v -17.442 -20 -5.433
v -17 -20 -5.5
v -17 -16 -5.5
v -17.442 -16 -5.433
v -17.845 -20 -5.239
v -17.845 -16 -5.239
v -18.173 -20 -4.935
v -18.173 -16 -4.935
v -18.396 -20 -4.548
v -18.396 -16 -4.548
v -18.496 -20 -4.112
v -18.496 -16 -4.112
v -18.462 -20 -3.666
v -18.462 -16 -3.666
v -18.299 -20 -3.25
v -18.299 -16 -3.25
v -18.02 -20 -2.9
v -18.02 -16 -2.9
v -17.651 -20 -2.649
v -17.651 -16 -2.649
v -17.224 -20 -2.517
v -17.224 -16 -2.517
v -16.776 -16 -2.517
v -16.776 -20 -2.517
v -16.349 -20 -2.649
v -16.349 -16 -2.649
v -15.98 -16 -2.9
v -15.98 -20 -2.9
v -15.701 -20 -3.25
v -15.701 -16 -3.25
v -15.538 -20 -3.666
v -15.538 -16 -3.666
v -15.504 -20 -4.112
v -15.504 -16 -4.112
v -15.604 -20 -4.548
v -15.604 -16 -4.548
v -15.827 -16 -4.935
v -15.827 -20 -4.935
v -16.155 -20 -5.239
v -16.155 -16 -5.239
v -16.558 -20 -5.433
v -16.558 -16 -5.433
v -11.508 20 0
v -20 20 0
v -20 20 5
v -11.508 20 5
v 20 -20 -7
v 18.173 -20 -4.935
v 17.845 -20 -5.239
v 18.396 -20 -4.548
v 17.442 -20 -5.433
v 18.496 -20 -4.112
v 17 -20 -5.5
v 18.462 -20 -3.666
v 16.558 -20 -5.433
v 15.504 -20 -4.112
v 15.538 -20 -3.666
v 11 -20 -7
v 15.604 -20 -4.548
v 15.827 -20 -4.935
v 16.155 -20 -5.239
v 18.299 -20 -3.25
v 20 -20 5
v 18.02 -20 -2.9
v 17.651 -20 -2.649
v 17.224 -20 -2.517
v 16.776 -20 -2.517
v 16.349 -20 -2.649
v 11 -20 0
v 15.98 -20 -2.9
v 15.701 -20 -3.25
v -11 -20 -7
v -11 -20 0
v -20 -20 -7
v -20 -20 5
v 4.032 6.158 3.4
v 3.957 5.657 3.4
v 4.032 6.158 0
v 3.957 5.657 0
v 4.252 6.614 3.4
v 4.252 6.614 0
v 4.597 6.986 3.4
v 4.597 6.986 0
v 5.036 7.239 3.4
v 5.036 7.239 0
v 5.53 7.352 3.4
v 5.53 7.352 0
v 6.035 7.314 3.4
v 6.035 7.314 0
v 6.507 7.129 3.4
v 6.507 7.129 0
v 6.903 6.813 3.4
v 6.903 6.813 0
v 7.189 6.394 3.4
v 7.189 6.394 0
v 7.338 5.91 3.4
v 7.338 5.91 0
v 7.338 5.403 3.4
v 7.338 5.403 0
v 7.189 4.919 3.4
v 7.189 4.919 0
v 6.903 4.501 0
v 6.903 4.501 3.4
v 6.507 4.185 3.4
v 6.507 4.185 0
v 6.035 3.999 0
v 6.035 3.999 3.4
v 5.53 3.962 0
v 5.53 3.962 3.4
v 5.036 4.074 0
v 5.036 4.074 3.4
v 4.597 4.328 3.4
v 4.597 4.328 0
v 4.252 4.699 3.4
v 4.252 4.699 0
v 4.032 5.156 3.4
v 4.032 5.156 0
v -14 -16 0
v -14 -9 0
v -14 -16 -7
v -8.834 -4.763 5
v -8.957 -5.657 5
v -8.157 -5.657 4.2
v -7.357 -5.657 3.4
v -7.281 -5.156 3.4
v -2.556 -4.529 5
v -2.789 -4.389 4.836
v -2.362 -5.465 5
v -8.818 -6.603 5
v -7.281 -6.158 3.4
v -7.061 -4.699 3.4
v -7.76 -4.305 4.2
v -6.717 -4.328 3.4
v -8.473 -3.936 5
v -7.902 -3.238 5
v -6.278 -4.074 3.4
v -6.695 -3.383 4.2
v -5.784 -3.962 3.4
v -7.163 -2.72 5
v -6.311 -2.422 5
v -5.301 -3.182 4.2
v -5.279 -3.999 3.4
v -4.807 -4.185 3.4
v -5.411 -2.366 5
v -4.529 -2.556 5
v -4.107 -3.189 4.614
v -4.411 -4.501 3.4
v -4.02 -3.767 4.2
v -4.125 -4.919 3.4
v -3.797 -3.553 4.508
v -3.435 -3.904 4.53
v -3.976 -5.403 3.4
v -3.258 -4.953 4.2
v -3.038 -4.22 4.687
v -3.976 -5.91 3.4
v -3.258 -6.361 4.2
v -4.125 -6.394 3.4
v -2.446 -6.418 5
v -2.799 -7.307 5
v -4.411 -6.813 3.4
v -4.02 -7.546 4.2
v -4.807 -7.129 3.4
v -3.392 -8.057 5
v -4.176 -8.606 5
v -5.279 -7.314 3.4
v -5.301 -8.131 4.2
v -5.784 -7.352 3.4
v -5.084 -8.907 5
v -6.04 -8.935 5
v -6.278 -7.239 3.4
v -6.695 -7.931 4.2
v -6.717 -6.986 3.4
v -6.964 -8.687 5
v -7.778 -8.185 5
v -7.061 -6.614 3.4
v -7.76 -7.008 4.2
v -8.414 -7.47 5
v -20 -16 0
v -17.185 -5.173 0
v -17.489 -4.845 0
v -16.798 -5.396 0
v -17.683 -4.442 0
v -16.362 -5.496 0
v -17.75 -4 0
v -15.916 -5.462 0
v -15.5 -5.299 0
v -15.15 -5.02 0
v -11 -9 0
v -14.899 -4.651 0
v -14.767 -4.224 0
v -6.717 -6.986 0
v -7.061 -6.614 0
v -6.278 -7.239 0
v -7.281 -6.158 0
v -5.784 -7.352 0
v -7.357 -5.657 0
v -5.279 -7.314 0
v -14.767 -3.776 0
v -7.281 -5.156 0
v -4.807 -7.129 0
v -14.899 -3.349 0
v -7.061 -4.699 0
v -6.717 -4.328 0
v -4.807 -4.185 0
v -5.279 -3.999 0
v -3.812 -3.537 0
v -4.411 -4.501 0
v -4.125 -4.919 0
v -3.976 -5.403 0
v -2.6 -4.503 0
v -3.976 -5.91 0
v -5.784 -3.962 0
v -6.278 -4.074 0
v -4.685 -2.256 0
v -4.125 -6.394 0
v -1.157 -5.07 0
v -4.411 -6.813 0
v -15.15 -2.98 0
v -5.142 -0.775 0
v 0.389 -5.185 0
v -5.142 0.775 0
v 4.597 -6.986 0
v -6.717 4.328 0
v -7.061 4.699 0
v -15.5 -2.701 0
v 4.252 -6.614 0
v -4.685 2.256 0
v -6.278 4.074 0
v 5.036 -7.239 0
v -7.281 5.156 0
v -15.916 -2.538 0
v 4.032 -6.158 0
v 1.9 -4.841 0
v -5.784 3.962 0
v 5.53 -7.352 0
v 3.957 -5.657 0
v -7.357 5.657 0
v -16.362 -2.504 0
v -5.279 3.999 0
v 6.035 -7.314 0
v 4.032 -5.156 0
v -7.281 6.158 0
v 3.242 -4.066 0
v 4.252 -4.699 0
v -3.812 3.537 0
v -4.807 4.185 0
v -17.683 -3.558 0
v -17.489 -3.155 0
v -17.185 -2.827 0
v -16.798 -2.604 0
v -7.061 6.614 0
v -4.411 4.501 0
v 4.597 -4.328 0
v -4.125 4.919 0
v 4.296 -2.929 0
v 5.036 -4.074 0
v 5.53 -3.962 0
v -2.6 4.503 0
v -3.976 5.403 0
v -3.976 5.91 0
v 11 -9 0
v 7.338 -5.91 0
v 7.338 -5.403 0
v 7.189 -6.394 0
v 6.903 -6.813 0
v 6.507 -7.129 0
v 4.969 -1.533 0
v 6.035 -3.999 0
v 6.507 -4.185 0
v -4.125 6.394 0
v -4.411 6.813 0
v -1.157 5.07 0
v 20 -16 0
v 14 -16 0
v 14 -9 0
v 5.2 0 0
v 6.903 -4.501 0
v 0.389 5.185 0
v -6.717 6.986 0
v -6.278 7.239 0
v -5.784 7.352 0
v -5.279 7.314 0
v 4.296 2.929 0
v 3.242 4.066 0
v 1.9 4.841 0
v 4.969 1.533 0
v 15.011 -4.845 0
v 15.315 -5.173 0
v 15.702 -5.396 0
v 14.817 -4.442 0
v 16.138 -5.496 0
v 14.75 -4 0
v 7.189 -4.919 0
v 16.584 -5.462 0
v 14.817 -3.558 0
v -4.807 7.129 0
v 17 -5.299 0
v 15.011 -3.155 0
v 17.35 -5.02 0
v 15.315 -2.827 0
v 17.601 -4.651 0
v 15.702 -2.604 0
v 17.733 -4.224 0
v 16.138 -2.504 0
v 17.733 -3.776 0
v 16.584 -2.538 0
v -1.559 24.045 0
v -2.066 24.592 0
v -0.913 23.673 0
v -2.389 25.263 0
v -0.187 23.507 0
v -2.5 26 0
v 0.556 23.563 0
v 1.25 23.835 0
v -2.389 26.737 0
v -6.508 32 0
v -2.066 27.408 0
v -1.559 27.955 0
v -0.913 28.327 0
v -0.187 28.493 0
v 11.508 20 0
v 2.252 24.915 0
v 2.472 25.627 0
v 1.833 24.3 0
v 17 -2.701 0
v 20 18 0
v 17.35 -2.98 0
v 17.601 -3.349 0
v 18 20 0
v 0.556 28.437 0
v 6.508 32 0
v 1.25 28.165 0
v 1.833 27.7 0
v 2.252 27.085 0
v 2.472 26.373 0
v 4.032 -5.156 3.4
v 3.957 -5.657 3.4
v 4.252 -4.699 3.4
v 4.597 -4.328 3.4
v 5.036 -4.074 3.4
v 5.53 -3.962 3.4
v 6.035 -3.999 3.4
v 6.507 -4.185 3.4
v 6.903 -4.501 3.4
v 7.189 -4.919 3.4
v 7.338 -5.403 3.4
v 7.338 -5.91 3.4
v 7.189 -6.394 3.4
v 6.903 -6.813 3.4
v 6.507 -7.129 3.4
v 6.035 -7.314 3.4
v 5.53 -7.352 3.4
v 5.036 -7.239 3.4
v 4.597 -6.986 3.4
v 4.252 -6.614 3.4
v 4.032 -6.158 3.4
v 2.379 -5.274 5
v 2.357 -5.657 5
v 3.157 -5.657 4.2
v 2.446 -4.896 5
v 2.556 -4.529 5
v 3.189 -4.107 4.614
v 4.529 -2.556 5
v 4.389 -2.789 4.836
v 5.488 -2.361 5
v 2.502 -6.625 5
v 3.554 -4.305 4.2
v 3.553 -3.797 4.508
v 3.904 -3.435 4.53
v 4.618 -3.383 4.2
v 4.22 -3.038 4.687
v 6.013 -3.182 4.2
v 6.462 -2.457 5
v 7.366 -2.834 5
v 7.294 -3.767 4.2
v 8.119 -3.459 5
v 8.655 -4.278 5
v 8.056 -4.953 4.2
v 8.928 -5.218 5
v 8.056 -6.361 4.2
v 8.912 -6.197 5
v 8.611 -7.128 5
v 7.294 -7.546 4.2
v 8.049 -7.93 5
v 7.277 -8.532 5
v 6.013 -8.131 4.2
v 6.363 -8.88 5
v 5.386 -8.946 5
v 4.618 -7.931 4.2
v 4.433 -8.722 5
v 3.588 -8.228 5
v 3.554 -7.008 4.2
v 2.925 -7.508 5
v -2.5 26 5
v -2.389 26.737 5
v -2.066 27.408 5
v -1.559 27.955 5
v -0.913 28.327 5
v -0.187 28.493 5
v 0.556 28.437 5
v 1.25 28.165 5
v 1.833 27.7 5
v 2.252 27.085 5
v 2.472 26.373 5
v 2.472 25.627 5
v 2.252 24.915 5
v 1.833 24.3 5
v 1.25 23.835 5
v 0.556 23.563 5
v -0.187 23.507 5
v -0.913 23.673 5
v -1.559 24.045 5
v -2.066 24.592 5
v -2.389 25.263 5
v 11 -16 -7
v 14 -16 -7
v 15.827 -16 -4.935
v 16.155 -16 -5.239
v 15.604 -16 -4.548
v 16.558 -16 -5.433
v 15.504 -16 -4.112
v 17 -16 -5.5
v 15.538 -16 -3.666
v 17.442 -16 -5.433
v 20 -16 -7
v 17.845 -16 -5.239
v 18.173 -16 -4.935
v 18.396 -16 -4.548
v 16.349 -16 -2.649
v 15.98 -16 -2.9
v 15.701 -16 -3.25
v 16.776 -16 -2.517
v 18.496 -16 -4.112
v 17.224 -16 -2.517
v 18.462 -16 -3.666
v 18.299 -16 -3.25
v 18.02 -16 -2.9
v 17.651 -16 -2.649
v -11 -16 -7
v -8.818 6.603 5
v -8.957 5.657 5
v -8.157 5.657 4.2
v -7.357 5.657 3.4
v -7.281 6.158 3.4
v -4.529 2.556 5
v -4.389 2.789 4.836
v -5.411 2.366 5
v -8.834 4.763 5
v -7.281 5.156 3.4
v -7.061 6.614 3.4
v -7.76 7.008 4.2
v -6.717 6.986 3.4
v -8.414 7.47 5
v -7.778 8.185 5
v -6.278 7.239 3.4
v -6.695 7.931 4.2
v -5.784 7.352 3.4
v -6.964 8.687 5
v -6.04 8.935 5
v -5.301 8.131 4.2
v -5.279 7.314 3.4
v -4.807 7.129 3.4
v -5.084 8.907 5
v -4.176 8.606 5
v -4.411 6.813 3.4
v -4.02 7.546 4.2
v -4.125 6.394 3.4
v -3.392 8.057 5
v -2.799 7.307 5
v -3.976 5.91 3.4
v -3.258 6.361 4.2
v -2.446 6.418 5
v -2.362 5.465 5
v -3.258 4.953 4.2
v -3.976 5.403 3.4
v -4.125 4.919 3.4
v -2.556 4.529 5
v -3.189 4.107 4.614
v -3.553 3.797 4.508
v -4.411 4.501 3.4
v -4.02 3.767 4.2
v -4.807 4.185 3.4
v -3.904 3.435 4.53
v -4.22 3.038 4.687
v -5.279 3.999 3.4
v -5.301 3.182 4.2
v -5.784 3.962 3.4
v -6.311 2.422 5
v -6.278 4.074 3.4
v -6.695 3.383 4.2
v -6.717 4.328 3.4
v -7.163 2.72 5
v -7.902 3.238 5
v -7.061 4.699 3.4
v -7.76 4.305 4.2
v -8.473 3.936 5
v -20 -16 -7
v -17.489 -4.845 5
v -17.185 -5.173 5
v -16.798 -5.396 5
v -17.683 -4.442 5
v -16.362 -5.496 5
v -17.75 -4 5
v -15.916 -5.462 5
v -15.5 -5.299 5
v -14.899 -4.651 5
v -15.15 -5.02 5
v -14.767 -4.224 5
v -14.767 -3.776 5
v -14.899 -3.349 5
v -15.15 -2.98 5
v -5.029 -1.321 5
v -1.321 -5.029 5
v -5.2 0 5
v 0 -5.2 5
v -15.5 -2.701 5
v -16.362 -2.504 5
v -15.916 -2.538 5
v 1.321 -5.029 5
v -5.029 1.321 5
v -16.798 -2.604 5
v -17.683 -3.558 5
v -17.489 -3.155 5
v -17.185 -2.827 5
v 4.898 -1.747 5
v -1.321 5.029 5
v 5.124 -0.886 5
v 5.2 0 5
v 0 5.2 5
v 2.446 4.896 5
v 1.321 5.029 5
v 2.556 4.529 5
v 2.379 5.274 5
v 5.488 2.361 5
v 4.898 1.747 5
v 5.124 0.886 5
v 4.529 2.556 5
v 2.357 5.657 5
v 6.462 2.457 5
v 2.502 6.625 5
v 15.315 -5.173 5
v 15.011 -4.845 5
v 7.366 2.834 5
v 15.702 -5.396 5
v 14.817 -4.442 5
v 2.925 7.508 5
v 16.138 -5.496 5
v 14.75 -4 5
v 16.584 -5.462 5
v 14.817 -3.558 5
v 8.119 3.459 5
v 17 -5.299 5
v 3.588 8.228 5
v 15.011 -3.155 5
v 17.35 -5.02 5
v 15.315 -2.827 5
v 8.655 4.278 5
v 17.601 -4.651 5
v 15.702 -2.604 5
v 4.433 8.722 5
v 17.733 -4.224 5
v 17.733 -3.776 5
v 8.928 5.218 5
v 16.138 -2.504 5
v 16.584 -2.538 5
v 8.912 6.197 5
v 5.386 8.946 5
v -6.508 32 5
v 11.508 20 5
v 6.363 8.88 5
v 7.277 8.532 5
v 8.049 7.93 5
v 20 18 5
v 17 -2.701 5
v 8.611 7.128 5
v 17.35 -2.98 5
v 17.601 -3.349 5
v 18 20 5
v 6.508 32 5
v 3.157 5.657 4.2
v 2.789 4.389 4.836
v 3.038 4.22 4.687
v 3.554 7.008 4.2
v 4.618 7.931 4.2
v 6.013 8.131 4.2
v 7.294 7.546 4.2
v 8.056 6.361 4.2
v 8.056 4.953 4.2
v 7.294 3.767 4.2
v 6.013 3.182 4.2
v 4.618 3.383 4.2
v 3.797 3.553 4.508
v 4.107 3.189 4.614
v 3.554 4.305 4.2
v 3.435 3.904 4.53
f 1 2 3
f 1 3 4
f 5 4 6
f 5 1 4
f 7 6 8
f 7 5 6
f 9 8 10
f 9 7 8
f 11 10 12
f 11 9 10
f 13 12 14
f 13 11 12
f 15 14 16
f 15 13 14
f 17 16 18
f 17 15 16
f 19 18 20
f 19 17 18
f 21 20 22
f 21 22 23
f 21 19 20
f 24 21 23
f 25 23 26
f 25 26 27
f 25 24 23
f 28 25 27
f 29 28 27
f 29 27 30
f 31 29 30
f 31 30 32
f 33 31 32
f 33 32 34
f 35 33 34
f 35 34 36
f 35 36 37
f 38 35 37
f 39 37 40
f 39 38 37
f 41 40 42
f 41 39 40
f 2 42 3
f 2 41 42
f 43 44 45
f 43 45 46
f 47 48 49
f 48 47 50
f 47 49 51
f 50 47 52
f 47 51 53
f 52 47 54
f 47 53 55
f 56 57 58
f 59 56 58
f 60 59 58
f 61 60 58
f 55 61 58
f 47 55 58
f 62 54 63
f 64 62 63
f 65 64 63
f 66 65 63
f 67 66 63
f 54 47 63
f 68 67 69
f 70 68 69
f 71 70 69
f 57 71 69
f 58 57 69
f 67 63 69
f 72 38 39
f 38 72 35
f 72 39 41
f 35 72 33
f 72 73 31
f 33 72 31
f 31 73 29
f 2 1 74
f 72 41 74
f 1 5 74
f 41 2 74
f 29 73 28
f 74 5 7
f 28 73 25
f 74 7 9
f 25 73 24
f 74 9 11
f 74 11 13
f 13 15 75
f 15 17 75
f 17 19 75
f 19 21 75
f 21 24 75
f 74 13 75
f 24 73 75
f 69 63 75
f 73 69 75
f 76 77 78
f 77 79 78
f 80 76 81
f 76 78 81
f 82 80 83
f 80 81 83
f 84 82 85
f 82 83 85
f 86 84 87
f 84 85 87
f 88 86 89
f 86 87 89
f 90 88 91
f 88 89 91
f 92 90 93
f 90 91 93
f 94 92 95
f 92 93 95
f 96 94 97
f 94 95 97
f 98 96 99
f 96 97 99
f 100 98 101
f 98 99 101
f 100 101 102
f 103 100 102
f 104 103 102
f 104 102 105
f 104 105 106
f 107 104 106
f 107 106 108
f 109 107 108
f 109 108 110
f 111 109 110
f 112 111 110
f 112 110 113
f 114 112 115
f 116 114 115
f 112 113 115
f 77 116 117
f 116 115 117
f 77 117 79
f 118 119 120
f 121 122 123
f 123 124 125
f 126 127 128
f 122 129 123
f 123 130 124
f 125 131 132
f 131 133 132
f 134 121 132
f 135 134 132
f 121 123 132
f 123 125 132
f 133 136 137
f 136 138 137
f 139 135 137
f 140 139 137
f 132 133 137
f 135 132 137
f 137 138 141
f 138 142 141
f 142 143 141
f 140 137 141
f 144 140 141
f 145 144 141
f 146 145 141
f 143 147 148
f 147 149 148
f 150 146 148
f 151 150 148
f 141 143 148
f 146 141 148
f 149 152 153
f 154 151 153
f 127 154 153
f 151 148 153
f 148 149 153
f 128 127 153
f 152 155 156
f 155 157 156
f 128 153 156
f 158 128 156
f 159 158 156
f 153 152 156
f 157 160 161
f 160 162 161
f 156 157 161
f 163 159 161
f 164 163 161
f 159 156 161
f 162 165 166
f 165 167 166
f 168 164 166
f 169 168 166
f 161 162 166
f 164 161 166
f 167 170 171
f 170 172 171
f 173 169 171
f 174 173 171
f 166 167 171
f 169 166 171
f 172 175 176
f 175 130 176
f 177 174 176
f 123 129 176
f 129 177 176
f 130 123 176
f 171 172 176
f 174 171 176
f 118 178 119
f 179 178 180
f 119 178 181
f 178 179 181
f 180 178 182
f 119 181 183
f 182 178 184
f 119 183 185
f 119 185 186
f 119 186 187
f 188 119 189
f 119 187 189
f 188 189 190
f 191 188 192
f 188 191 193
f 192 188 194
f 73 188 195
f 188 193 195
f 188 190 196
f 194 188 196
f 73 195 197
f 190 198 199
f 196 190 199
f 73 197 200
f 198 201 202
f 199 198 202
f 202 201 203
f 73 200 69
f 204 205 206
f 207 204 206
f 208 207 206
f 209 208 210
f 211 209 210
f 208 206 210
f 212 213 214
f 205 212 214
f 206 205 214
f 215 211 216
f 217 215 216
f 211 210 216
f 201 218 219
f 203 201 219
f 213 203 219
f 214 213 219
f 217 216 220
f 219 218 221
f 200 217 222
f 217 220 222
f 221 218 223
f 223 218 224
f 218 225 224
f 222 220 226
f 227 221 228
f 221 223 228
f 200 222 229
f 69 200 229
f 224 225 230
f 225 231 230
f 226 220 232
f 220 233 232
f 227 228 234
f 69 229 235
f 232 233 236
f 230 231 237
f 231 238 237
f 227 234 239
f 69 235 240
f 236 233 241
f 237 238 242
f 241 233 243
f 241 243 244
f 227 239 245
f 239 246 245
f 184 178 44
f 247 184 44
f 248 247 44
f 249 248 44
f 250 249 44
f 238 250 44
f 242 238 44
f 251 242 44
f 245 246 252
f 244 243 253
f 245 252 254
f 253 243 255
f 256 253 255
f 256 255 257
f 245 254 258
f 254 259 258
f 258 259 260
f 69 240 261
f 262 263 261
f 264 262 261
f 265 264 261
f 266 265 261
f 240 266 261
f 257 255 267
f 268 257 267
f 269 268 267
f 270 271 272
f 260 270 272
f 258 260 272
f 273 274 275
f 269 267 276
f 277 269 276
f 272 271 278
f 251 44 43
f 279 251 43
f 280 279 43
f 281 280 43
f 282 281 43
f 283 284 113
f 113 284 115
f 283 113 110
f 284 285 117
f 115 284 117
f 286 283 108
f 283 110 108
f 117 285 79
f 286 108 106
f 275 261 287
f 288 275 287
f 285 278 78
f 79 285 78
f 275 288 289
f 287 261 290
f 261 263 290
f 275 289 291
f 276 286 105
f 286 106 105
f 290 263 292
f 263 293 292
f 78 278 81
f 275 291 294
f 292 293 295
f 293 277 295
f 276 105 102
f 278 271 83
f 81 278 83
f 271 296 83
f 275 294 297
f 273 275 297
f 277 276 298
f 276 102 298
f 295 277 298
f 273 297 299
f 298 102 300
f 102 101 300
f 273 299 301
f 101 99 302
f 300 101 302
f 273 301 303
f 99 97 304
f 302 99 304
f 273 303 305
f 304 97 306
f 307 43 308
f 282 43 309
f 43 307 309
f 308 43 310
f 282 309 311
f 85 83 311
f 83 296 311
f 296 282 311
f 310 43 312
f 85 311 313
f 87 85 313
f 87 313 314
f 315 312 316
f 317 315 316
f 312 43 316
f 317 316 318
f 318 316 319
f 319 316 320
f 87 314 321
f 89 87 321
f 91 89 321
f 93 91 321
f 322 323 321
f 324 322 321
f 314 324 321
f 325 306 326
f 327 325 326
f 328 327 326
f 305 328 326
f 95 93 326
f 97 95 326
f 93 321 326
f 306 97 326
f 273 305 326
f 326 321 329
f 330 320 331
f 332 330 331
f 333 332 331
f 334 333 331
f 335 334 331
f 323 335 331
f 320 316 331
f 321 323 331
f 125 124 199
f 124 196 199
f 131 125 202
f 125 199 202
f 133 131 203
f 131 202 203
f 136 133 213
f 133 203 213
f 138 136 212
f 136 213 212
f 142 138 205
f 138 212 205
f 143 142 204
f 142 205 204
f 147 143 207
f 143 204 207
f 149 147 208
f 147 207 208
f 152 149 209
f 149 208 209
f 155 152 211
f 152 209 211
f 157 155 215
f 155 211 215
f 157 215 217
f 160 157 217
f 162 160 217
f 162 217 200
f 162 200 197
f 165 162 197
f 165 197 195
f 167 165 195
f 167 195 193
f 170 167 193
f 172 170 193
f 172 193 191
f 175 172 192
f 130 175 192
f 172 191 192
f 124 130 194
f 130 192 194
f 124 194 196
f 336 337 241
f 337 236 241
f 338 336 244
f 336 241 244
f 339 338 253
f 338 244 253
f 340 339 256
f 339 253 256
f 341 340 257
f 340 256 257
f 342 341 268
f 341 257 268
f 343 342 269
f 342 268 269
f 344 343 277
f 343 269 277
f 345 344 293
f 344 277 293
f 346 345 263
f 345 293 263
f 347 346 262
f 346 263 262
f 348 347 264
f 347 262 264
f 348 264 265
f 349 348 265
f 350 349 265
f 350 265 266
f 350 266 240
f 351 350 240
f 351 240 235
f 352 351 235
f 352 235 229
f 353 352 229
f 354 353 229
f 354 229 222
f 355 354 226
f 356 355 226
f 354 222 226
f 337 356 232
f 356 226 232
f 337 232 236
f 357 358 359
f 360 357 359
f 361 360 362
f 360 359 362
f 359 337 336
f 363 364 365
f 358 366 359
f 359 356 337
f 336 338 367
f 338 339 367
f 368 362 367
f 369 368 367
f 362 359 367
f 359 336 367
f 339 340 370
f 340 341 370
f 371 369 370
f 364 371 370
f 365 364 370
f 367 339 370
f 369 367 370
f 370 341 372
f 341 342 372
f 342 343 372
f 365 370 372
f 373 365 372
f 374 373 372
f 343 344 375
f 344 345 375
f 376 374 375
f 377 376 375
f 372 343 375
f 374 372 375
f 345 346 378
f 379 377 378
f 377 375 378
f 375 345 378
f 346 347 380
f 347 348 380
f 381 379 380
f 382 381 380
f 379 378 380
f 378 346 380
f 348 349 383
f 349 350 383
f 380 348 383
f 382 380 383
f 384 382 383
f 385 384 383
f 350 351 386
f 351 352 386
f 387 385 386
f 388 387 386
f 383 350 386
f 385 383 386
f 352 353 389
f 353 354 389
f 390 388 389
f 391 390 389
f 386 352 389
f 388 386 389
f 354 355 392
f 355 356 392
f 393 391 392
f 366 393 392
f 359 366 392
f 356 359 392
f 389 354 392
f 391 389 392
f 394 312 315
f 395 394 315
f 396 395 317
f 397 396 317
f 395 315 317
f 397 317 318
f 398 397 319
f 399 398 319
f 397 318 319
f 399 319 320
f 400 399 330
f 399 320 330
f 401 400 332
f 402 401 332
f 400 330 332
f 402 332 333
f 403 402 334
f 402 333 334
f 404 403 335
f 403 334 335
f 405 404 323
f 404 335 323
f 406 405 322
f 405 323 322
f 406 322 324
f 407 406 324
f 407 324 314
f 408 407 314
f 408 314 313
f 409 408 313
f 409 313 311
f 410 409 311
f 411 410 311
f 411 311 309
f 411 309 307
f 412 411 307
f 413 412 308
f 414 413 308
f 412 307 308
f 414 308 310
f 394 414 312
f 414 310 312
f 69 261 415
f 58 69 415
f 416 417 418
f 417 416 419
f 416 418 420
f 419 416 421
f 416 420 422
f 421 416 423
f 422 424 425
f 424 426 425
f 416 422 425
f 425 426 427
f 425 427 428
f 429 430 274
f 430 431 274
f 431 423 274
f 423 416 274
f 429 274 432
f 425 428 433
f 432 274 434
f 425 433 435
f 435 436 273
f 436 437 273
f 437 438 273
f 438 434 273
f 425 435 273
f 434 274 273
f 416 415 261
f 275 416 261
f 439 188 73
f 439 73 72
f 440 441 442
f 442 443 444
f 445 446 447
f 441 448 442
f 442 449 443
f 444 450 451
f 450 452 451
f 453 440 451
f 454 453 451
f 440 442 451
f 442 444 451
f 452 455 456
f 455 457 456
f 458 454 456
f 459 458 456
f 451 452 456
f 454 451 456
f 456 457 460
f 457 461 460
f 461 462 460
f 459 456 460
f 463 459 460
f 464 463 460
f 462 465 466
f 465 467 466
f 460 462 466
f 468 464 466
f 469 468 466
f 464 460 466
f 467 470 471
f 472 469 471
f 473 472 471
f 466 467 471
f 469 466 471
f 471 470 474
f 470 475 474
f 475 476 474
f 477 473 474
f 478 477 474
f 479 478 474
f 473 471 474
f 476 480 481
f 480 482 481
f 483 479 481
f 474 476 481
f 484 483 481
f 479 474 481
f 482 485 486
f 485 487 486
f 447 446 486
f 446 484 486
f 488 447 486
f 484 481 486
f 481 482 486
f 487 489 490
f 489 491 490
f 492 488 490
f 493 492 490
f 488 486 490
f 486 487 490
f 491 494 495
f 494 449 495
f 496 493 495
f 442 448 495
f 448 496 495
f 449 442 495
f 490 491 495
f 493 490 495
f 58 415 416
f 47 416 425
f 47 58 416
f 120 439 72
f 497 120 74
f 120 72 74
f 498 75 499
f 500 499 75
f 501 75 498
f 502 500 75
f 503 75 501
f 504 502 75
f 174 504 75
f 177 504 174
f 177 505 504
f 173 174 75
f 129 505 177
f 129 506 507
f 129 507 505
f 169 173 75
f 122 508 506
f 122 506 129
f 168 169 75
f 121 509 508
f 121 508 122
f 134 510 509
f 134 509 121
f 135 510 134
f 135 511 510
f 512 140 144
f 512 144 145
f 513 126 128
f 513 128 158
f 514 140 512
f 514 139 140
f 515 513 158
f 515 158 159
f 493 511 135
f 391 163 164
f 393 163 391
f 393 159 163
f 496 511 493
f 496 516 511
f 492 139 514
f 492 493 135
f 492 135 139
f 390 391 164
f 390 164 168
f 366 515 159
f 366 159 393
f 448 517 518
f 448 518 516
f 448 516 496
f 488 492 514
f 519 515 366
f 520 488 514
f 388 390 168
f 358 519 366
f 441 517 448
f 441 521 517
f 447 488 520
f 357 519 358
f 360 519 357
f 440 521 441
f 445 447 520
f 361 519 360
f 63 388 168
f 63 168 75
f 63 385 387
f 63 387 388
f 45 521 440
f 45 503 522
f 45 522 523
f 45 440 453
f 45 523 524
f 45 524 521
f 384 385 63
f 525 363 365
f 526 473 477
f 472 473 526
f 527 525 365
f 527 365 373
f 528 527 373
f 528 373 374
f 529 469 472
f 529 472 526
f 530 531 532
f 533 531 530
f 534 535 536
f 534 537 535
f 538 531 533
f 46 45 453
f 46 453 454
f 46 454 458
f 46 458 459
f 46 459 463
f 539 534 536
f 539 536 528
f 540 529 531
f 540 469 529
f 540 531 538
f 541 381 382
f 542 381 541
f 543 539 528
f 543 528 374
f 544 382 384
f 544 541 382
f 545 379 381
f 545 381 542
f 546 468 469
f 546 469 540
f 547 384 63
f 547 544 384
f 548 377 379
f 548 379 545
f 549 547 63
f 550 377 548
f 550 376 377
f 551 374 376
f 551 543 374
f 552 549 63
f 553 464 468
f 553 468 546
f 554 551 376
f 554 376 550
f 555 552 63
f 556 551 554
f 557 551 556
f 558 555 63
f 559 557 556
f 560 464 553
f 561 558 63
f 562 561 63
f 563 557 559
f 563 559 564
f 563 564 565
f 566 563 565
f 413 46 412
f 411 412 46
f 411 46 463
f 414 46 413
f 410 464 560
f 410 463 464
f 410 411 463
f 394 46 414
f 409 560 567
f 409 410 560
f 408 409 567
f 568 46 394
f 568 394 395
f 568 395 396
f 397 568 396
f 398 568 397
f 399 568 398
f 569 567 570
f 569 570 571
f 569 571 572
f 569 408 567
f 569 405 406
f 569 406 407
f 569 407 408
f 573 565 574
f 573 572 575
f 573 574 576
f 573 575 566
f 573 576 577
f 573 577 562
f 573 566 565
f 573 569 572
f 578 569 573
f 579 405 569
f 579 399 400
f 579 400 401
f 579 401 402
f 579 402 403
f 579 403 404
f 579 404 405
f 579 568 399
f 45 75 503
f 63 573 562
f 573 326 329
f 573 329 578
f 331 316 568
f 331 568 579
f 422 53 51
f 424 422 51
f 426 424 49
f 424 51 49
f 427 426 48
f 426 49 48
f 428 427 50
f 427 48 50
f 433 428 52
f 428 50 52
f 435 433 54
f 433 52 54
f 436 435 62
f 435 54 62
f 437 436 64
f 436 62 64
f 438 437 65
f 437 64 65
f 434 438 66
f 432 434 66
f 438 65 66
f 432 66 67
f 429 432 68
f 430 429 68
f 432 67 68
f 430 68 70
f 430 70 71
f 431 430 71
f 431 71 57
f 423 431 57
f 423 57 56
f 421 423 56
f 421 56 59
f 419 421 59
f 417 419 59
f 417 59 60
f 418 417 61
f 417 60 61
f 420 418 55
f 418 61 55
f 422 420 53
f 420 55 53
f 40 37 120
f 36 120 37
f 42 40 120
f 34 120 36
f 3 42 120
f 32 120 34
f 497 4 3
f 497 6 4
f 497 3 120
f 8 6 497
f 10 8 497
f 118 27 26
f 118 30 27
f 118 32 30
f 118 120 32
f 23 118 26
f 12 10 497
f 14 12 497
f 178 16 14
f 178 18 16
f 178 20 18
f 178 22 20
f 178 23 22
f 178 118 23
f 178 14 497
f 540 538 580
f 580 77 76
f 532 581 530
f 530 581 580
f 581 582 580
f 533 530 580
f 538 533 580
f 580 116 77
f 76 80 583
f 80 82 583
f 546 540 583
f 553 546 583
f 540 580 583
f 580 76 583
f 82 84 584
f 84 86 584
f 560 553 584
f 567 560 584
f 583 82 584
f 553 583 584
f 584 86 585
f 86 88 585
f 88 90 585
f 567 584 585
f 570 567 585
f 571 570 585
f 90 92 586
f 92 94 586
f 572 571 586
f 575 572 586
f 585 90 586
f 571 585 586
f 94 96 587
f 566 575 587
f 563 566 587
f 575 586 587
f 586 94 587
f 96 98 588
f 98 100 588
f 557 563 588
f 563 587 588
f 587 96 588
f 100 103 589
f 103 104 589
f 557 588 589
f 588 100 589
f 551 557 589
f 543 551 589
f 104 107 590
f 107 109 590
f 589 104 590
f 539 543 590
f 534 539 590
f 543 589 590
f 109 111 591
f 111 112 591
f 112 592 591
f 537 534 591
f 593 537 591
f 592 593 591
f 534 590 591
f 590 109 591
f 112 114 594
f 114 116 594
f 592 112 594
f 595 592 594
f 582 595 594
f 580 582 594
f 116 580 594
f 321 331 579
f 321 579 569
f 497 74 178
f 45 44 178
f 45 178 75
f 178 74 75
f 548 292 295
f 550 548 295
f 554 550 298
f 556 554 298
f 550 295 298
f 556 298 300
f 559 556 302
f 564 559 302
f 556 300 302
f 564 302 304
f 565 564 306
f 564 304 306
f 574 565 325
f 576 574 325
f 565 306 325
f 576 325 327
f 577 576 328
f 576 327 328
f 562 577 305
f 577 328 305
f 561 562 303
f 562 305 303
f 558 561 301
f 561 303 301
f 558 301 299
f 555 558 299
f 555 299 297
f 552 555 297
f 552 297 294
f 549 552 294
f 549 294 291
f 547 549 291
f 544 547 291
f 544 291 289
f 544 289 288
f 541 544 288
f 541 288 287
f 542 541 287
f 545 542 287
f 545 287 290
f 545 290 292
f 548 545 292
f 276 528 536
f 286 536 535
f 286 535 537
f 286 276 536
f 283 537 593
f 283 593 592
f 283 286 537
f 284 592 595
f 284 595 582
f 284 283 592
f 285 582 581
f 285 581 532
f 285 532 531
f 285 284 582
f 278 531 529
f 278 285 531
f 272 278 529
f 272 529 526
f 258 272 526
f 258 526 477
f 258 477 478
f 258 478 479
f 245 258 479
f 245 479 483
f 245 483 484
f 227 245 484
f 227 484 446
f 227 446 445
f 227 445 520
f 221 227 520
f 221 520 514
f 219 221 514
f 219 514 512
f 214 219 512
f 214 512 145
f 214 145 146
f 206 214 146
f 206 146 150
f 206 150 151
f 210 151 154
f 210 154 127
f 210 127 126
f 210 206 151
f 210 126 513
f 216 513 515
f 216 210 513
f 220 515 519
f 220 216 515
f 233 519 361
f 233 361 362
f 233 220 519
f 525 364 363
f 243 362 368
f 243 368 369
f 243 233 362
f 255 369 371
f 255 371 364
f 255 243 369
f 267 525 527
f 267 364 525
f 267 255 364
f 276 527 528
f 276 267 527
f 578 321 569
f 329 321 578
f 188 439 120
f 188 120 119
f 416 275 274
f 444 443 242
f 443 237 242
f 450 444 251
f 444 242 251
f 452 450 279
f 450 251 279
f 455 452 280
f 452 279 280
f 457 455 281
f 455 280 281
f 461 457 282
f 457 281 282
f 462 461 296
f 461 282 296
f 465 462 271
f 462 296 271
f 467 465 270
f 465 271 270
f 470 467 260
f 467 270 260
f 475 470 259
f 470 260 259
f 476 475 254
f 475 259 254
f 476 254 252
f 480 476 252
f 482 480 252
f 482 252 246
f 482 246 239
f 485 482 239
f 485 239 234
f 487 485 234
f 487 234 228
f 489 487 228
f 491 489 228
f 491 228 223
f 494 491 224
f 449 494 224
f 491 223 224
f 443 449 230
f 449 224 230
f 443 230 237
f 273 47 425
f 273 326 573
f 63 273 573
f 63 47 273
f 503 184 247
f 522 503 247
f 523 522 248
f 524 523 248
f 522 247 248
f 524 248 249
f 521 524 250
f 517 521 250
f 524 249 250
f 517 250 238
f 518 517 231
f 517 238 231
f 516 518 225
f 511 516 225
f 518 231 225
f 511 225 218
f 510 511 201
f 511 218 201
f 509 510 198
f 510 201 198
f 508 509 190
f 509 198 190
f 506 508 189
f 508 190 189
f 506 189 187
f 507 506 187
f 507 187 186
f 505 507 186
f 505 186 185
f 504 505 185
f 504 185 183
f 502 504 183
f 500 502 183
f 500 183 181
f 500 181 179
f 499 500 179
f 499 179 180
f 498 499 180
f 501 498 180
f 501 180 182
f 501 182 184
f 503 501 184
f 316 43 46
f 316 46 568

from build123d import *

# Parameters (mm, degrees)
SKETCH_1_W                   = 40
SKETCH_1_H                   = 40
SKETCH_1_R                   = 5.2
SKETCH_1_R_2                 = 1.6
EXTRUDE_1_DEPTH              = 5
HOLE_WIZARD_1_D              = 3
CHAMFER_1_SIZE               = 2
HOLE_WIZARD_M3_2_D           = 3.4
HOLE_WIZARD_M3_2_CSINK_D     = 6.6
HOLE_WIZARD_M3_2_CSINK_ANGLE = 90
SKETCH_7_R                   = 2.5
EXTRUDE_2_DEPTH              = 5
SKETCH_10_W                  = 9
SKETCH_10_H                  = 7
SKETCH_10_R                  = 1.5
EXTRUDE_4_DEPTH              = 4
EXTRUDE_6_DEPTH              = 3


with BuildPart() as part:
    # 草图1 → 凸台-拉伸1 (new body)
    with BuildSketch(Plane.XY):
        Rectangle(SKETCH_1_W, SKETCH_1_H)
        Circle(SKETCH_1_R, mode=Mode.SUBTRACT)
        with Locations((5.656854249, 5.656854249)):
            Circle(SKETCH_1_R_2, mode=Mode.SUBTRACT)
        with Locations((5.656854249, -5.656854249)):
            Circle(SKETCH_1_R_2, mode=Mode.SUBTRACT)
        with Locations((-5.656854249, -5.656854249)):
            Circle(SKETCH_1_R_2, mode=Mode.SUBTRACT)
        with Locations((-5.656854249, 5.656854249)):
            Circle(SKETCH_1_R_2, mode=Mode.SUBTRACT)
    extrude(amount=EXTRUDE_1_DEPTH)

    # 孔1 (through all)
    with Locations(Plane(origin=(16.25, -4, 5), x_dir=(1, 0, 0), z_dir=(0, 0, 1))):
        with Locations((0, 0), (-32.5, 0)):
            Hole(HOLE_WIZARD_1_D / 2)

    # 倒角1
    chamfer_1_edges = [part.edges().sort_by_distance(p)[0] for p in [
        (20, 20, 2.5),
    ]]
    chamfer(chamfer_1_edges, length=CHAMFER_1_SIZE)

    # M3 十字槽沉头木螺钉的锥形沉头孔2 (through all)
    with Locations(Plane.XY.offset(5)):
        with Locations((-5.656854249, 5.656854249), (5.656854249, 5.656854249), (5.656854249, -5.656854249), (-5.656854249, -5.656854249)):
            CounterSinkHole(HOLE_WIZARD_M3_2_D / 2, HOLE_WIZARD_M3_2_CSINK_D / 2, counter_sink_angle=HOLE_WIZARD_M3_2_CSINK_ANGLE)

    # 草图7 → 凸台-拉伸2 (add)
    with BuildSketch(Plane(origin=(0, 0, 0), x_dir=(-1, 0, 0), z_dir=(0, 0, -1))):
        Polygon((-11.507772726, 20), (-6.507772726, 20), (6.507772726, 20), (11.507772726, 20), (6.507772726, 32), (-6.507772726, 32), align=None)
        with Locations((0, 26)):
            Circle(SKETCH_7_R, mode=Mode.SUBTRACT)
    extrude(amount=-EXTRUDE_2_DEPTH)

    # 草图10 → 凸台-拉伸4 (add)
    with BuildSketch(Plane.XZ.offset(20)):
        with Locations((15.5, -3.5)):
            Rectangle(SKETCH_10_W, SKETCH_10_H)
        with Locations(Location((17, -4, 0), (0, 0, 270))):
            Circle(SKETCH_10_R, mode=Mode.SUBTRACT)
    extrude_4 = extrude(amount=-EXTRUDE_4_DEPTH)

    # 草图12 → 凸台-拉伸6 (add)
    with BuildSketch(Plane.ZY.offset(-11)):
        Polygon((-7, -16), (0, -9), (0, -16), align=None)
    extrude_6 = extrude(amount=-EXTRUDE_6_DEPTH)

    # 镜向2: 凸台-拉伸4, 凸台-拉伸6 across plane
    add(extrude_4.mirror(Plane(origin=(0, 0, 0), x_dir=(0, 0, 1), z_dir=(1, 0, 0))))
    add(extrude_6.mirror(Plane(origin=(0, 0, 0), x_dir=(0, 0, 1), z_dir=(1, 0, 0))))


solid = part.part
